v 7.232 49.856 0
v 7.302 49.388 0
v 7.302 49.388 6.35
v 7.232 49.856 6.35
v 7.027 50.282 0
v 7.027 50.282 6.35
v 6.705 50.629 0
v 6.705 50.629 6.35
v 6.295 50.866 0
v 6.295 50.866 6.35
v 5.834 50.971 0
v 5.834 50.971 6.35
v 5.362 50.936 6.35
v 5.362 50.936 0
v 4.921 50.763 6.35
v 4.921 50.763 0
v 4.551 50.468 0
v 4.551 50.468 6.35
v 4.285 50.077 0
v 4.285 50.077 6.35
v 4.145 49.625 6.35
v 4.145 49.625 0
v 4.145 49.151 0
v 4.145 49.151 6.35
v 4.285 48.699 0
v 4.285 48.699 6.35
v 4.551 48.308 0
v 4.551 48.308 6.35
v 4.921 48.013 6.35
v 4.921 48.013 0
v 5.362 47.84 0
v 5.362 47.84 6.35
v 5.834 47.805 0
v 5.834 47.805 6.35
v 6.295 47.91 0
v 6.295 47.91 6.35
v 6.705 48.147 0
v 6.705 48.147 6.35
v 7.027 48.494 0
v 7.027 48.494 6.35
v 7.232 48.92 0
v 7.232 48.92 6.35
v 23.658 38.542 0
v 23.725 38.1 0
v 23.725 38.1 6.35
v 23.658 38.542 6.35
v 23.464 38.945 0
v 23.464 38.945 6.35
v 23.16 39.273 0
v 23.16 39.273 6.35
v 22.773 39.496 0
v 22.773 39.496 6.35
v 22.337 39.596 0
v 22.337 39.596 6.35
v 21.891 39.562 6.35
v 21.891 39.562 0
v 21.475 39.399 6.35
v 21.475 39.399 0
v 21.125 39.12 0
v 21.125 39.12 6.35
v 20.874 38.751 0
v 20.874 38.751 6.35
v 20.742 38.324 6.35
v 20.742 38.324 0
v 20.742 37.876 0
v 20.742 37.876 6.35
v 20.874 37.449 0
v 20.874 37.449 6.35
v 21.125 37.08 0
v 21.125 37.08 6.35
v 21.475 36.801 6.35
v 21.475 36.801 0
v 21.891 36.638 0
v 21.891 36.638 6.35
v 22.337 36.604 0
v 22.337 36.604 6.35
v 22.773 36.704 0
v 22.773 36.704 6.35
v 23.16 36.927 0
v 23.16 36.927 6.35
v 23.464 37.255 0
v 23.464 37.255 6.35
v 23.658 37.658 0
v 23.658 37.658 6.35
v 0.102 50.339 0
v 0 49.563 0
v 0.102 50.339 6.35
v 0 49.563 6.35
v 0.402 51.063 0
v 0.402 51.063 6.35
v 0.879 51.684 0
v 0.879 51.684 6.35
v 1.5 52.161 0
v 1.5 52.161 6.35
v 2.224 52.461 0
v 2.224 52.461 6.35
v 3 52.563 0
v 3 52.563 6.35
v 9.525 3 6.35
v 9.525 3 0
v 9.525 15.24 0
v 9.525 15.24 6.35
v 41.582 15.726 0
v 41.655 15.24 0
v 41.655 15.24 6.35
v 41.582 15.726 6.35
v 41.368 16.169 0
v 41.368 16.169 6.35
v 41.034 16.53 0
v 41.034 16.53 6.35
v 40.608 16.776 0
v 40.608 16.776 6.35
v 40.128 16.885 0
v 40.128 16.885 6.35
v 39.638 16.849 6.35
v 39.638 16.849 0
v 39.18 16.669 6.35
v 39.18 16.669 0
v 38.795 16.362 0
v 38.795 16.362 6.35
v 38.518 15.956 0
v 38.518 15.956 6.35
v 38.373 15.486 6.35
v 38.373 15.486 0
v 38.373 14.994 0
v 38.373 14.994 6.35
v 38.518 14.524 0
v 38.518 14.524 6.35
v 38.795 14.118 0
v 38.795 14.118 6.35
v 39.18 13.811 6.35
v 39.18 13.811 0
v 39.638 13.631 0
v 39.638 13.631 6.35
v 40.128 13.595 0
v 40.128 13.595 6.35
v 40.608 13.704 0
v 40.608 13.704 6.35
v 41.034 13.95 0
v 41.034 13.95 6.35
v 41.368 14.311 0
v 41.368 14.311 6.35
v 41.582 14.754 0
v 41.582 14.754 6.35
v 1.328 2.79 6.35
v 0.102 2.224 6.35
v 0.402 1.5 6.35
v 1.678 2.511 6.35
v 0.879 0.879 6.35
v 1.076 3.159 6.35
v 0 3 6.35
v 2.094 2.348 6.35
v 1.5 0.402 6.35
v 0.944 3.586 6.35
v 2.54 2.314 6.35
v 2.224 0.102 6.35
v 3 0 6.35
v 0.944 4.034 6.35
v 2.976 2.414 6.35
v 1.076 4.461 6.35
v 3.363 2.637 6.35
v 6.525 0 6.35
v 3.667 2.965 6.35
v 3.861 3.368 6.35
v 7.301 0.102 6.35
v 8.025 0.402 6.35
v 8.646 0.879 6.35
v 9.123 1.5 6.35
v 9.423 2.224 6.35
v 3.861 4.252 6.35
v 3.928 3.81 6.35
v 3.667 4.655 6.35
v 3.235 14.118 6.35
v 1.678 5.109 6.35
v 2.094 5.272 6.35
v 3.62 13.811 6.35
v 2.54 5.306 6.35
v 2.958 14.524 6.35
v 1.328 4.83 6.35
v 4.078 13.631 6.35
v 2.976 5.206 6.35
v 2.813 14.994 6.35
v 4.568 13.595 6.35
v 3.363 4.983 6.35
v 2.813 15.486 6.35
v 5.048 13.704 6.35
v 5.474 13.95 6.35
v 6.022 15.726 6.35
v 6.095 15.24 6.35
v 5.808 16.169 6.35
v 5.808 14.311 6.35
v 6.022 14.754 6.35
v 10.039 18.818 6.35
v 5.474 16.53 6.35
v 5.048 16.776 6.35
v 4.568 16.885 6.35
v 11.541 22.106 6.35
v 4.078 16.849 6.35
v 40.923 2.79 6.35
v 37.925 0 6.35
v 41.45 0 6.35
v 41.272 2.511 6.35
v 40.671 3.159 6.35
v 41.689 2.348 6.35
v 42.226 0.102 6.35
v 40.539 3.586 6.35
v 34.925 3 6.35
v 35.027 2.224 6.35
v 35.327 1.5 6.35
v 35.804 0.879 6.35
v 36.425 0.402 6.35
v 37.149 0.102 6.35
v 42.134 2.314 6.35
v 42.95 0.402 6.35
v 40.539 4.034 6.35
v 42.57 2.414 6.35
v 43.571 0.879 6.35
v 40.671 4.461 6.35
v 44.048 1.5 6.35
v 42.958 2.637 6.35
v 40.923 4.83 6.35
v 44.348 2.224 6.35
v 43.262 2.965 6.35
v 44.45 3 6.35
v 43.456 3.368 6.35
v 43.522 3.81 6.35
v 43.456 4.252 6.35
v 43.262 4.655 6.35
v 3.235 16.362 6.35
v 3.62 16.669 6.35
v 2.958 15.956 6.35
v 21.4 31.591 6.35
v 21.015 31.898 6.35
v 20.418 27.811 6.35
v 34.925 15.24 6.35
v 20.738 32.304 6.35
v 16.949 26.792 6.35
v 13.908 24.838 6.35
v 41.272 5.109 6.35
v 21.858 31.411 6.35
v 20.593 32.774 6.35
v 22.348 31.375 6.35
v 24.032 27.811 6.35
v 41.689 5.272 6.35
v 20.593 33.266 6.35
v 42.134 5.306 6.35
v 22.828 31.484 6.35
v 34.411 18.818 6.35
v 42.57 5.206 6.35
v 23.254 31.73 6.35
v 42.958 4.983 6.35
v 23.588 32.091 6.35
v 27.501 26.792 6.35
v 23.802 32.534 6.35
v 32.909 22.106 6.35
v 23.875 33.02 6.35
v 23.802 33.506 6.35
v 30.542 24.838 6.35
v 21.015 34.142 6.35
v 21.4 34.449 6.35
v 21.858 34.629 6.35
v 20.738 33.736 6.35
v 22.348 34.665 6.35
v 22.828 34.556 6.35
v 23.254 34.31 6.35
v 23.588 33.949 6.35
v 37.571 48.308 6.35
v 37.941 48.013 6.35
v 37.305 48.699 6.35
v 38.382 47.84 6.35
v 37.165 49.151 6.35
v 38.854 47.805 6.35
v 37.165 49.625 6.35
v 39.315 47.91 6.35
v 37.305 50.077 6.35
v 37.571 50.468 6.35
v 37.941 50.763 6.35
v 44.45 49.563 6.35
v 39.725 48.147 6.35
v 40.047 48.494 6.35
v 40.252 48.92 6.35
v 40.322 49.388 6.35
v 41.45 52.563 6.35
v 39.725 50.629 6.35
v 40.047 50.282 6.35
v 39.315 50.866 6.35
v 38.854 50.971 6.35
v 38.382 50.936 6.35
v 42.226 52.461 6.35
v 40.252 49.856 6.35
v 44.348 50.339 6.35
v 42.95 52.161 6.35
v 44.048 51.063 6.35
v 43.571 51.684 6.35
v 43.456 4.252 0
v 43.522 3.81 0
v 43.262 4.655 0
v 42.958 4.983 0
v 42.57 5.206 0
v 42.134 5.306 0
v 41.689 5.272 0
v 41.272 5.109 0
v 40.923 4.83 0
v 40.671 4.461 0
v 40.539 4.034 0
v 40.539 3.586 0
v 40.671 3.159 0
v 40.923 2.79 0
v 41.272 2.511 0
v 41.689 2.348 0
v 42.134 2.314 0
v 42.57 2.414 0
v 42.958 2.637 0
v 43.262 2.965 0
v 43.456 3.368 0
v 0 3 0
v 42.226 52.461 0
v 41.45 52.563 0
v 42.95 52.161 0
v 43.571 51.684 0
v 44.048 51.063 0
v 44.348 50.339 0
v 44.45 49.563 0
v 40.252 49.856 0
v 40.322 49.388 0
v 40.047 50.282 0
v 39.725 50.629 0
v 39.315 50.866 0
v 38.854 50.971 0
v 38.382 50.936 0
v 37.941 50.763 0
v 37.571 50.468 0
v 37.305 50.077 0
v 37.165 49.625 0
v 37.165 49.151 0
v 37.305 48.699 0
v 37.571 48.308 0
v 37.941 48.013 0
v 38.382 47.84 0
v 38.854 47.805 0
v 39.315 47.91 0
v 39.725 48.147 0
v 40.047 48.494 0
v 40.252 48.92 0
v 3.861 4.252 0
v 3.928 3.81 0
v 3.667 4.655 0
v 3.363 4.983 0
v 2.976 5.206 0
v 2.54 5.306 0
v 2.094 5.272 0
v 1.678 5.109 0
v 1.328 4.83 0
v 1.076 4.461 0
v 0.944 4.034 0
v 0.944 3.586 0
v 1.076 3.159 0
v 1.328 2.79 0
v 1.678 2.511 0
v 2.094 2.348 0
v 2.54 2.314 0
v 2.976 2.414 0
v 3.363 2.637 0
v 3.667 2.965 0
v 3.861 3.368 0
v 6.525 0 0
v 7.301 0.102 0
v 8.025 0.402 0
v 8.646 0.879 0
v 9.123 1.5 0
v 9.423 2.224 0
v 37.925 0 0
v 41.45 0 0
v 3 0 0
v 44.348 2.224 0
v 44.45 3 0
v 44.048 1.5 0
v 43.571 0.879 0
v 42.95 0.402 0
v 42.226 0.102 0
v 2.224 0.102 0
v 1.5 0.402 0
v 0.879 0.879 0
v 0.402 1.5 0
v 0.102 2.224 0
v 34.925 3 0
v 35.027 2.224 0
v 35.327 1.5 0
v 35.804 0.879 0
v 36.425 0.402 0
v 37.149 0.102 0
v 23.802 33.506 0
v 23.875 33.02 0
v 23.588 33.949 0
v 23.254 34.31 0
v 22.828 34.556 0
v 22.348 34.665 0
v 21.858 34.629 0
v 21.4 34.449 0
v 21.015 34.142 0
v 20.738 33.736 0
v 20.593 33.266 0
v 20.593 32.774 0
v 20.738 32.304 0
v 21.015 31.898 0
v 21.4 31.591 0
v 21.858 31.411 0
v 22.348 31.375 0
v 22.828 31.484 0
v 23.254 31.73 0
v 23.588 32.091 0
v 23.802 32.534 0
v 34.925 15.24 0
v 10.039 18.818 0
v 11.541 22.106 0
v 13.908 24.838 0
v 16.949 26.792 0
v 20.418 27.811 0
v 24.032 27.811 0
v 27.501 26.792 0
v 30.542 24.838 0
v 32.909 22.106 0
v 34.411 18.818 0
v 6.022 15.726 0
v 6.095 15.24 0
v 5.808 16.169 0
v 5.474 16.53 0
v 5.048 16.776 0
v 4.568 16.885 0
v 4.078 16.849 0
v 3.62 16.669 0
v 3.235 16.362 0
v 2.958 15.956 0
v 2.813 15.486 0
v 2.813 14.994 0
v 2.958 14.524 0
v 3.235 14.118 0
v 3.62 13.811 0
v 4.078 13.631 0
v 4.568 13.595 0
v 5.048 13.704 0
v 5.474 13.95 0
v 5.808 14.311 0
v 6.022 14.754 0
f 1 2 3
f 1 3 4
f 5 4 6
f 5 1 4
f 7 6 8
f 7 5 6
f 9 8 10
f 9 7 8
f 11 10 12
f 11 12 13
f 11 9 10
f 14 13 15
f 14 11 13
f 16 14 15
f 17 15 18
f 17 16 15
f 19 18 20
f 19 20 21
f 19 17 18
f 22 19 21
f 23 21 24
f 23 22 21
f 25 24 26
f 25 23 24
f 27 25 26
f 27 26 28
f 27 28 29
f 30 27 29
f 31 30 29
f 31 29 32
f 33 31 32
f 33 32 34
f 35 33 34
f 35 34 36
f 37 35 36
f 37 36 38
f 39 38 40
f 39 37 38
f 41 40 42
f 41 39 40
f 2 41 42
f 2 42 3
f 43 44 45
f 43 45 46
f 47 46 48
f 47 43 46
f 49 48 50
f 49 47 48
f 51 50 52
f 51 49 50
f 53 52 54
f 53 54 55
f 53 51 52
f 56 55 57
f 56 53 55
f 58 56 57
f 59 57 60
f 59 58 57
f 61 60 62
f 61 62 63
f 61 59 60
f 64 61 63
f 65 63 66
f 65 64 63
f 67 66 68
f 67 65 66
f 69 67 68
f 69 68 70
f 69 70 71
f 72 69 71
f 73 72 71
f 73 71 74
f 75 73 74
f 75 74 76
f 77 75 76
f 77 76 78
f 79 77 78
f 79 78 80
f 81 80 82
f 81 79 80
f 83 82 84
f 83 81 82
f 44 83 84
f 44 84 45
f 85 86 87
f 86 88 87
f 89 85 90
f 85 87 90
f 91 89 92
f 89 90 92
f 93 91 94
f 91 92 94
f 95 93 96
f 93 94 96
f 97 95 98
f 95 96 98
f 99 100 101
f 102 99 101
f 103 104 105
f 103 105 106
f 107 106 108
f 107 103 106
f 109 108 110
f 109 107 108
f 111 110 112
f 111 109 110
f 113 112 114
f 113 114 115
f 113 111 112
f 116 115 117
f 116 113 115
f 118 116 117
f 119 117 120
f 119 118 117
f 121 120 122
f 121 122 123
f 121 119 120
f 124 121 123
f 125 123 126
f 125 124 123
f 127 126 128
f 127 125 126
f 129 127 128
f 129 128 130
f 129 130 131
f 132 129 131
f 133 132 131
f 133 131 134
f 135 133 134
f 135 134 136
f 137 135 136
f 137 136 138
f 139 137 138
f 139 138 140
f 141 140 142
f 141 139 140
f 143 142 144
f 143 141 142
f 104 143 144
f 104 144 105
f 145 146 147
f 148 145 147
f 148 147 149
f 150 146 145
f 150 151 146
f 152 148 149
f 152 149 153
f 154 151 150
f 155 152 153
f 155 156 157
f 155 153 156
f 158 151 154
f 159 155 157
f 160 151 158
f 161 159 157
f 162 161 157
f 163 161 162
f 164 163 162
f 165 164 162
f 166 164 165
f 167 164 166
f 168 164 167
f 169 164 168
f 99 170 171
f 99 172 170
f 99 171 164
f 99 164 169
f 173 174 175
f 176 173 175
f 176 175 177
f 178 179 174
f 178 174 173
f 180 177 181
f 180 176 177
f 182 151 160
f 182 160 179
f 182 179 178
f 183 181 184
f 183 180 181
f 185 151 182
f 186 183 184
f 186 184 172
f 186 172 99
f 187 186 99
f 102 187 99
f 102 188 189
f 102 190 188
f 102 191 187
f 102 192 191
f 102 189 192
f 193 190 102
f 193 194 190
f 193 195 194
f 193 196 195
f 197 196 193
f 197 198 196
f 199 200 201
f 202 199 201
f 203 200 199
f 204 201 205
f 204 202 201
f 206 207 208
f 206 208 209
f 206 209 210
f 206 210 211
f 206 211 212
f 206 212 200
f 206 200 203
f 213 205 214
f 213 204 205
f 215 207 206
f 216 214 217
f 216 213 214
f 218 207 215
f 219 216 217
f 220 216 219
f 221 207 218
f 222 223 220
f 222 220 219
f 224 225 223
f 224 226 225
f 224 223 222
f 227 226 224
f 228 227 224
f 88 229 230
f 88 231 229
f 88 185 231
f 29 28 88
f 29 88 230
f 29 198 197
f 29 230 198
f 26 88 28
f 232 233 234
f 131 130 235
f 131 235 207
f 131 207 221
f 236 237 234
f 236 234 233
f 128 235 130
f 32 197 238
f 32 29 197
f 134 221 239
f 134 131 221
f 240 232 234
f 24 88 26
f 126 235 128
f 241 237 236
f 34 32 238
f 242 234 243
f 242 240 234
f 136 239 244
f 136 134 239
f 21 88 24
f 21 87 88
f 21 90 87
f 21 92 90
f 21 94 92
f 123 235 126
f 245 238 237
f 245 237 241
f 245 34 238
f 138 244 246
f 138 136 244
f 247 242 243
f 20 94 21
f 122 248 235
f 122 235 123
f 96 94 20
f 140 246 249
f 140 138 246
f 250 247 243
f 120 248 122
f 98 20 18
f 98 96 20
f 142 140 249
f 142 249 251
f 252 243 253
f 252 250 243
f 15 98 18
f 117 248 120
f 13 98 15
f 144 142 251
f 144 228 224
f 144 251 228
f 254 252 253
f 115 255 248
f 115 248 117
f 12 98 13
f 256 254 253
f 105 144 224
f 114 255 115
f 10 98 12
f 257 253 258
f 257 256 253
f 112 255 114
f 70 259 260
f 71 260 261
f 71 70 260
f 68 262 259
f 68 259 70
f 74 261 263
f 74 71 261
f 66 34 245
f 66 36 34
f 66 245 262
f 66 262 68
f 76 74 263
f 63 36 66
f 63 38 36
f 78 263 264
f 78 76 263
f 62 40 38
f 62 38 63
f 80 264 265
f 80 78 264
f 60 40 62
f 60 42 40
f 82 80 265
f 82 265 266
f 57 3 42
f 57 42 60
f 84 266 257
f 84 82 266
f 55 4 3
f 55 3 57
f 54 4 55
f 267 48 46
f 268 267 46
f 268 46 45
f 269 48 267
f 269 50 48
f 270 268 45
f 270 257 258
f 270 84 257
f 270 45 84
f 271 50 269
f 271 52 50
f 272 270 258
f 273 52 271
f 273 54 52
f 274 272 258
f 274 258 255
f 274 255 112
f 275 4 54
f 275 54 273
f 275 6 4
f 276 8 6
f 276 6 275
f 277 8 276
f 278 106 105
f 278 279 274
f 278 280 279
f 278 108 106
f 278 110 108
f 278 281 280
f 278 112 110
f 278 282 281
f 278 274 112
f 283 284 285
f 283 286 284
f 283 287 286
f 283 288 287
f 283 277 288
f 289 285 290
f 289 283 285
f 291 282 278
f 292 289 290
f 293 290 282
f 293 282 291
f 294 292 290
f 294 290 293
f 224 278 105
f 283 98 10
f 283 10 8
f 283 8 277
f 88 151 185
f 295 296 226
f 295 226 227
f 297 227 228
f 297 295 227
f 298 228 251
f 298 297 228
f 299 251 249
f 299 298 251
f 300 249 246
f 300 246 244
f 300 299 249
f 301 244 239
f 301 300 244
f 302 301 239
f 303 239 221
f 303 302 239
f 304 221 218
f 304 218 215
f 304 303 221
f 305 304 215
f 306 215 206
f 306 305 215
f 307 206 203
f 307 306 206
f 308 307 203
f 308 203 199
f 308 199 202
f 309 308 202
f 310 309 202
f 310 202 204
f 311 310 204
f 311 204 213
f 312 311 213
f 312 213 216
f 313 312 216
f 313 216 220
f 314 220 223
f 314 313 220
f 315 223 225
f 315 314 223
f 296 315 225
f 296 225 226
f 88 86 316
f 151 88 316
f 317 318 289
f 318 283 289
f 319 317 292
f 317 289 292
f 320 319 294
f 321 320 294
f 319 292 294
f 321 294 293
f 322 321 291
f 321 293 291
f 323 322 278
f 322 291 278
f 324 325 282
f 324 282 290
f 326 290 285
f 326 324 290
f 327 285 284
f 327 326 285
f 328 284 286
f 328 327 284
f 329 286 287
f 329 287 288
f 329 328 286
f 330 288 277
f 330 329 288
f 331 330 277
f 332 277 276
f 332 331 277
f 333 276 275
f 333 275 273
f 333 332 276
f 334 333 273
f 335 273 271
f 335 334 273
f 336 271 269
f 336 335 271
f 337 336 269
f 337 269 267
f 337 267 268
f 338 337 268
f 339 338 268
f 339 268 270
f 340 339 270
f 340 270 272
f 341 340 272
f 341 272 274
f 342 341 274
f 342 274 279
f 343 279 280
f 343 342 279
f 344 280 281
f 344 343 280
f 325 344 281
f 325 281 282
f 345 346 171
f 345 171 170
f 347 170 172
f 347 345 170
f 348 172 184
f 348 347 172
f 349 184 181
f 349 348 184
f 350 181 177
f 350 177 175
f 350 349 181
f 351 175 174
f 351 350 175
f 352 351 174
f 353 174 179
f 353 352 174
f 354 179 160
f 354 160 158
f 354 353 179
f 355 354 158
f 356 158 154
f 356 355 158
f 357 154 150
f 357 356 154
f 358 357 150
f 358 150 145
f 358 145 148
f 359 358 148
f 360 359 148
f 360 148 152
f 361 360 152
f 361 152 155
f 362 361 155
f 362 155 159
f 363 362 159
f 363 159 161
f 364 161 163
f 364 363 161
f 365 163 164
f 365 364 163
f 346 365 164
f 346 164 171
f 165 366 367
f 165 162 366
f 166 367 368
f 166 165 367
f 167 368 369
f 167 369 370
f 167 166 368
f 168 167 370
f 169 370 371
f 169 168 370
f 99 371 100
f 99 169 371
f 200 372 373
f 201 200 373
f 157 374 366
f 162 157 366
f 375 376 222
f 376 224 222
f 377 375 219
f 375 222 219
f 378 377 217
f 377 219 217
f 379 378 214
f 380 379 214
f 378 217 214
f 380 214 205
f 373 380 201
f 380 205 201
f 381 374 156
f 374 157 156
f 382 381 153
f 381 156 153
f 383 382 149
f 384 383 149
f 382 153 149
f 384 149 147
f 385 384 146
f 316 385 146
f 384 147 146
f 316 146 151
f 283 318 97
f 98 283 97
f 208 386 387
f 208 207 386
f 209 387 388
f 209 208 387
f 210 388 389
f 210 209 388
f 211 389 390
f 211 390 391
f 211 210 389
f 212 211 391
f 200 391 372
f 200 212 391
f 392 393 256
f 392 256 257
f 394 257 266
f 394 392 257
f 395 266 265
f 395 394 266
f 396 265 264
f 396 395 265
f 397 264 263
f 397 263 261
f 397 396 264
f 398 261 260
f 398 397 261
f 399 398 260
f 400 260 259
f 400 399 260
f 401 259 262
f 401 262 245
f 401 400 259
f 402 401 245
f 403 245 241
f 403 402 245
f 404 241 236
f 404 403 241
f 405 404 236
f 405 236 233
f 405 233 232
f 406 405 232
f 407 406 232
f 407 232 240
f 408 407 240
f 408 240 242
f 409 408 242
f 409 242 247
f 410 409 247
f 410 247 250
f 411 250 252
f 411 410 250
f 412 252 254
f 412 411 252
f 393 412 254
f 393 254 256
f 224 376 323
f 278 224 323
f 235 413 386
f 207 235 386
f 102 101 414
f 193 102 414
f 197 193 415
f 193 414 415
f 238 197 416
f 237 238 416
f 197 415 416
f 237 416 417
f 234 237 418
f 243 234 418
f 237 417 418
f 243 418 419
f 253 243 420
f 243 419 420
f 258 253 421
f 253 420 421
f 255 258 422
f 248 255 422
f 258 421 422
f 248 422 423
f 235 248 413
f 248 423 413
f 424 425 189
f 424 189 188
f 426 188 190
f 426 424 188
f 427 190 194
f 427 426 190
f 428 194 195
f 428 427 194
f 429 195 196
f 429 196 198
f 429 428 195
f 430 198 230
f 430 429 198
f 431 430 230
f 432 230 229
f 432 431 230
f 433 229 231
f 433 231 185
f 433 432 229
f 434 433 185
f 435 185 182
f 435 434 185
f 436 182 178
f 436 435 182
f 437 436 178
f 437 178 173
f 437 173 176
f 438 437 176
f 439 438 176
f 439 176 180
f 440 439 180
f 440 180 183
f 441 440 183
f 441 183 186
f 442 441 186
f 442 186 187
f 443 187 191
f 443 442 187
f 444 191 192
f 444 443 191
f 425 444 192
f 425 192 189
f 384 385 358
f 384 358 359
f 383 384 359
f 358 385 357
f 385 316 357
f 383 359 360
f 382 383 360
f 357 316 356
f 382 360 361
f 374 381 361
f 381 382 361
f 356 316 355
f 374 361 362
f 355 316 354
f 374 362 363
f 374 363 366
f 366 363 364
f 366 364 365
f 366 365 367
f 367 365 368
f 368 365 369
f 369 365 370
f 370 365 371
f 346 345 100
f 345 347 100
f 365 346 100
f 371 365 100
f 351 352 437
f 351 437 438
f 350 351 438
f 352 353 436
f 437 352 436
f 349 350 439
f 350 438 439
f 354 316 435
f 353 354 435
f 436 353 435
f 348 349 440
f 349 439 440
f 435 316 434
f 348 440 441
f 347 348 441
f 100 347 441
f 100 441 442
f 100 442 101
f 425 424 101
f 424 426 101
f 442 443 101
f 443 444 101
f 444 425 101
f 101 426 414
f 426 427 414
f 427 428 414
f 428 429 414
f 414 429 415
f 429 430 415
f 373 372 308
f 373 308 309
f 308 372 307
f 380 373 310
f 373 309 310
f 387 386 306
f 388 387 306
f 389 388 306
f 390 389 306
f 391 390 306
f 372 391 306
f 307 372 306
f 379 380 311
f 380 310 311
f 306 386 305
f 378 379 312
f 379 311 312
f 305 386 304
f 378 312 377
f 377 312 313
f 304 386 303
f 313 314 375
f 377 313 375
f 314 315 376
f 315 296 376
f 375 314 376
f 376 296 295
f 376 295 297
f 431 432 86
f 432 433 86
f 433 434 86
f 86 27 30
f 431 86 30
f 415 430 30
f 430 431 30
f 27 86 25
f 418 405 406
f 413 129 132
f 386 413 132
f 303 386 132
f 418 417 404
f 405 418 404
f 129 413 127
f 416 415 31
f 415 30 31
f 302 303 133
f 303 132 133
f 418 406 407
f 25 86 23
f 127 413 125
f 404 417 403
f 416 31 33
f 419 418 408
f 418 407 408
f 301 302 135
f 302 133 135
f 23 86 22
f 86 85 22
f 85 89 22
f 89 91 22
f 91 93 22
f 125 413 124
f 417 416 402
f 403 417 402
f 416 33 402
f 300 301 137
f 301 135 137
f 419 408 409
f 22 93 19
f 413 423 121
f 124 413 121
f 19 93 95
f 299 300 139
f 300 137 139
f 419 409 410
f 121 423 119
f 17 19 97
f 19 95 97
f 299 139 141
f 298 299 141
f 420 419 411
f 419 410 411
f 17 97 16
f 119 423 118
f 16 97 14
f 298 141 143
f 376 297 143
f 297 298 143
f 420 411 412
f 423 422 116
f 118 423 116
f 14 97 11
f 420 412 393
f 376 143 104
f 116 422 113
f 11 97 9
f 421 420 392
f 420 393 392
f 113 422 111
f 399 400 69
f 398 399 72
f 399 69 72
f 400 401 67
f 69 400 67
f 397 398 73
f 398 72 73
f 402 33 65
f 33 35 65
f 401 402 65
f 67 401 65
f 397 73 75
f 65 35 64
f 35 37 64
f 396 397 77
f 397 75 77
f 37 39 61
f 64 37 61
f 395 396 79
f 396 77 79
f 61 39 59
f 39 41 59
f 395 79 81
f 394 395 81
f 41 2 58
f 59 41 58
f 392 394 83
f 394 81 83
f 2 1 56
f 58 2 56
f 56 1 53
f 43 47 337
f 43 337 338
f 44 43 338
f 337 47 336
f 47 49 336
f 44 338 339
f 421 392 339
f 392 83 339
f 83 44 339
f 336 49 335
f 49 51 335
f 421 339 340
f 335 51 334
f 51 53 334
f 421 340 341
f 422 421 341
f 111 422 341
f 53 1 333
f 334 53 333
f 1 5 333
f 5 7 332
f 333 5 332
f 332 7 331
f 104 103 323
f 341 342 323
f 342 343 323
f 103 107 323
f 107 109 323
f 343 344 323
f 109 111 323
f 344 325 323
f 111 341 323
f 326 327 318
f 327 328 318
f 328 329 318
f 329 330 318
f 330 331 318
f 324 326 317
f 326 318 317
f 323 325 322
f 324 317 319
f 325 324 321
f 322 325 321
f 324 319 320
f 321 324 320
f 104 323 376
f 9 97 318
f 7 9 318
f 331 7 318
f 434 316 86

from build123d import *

# Parameters (mm, degrees)
SKETCH1_R           = 1.5875
SKETCH1_R_2         = 1.65
SKETCH1_R_3         = 1.5
BOSS_EXTRUDE1_DEPTH = 6.35
FILLET1_R           = 3


with BuildPart() as part:
    # Sketch1 → Boss-Extrude1 (new body)
    with BuildSketch(Plane.XY):
        with BuildLine():
            Line((0, 0), (9.525, 0))
            Line((9.525, 0), (9.525, 15.24))
            ThreePointArc((9.525, 15.24), (22.225, 27.94), (34.925, 15.24))
            Line((34.925, 15.24), (34.925, 0))
            Line((34.925, 0), (44.45, 0))
            Line((44.45, 0), (44.45, 52.563))
            Line((44.45, 52.563), (0, 52.563))
            Line((0, 52.563), (0, 0))
        make_face()
        with Locations((5.715, 49.388)):
            Circle(SKETCH1_R, mode=Mode.SUBTRACT)
        with Locations((38.735, 49.388)):
            Circle(SKETCH1_R, mode=Mode.SUBTRACT)
        with Locations((4.445, 15.24)):
            Circle(SKETCH1_R_2, mode=Mode.SUBTRACT)
        with Locations((22.225, 33.02)):
            Circle(SKETCH1_R_2, mode=Mode.SUBTRACT)
        with Locations((40.005, 15.24)):
            Circle(SKETCH1_R_2, mode=Mode.SUBTRACT)
        with Locations((22.225, 38.1)):
            Circle(SKETCH1_R_3, mode=Mode.SUBTRACT)
        with Locations((42.022340731, 3.81)):
            Circle(SKETCH1_R_3, mode=Mode.SUBTRACT)
        with Locations((2.427659269, 3.81)):
            Circle(SKETCH1_R_3, mode=Mode.SUBTRACT)
    extrude(amount=BOSS_EXTRUDE1_DEPTH)

    # Fillet1
    fillet1_edges = [part.edges().sort_by_distance(p)[0] for p in [
        (9.525, 0, 3.175),
        (0, 0, 3.175),
        (0, 52.563, 3.175),
        (44.45, 52.563, 3.175),
        (44.45, 0, 3.175),
        (34.925, 0, 3.175),
    ]]
    fillet(fillet1_edges, radius=FILLET1_R)


solid = part.part
